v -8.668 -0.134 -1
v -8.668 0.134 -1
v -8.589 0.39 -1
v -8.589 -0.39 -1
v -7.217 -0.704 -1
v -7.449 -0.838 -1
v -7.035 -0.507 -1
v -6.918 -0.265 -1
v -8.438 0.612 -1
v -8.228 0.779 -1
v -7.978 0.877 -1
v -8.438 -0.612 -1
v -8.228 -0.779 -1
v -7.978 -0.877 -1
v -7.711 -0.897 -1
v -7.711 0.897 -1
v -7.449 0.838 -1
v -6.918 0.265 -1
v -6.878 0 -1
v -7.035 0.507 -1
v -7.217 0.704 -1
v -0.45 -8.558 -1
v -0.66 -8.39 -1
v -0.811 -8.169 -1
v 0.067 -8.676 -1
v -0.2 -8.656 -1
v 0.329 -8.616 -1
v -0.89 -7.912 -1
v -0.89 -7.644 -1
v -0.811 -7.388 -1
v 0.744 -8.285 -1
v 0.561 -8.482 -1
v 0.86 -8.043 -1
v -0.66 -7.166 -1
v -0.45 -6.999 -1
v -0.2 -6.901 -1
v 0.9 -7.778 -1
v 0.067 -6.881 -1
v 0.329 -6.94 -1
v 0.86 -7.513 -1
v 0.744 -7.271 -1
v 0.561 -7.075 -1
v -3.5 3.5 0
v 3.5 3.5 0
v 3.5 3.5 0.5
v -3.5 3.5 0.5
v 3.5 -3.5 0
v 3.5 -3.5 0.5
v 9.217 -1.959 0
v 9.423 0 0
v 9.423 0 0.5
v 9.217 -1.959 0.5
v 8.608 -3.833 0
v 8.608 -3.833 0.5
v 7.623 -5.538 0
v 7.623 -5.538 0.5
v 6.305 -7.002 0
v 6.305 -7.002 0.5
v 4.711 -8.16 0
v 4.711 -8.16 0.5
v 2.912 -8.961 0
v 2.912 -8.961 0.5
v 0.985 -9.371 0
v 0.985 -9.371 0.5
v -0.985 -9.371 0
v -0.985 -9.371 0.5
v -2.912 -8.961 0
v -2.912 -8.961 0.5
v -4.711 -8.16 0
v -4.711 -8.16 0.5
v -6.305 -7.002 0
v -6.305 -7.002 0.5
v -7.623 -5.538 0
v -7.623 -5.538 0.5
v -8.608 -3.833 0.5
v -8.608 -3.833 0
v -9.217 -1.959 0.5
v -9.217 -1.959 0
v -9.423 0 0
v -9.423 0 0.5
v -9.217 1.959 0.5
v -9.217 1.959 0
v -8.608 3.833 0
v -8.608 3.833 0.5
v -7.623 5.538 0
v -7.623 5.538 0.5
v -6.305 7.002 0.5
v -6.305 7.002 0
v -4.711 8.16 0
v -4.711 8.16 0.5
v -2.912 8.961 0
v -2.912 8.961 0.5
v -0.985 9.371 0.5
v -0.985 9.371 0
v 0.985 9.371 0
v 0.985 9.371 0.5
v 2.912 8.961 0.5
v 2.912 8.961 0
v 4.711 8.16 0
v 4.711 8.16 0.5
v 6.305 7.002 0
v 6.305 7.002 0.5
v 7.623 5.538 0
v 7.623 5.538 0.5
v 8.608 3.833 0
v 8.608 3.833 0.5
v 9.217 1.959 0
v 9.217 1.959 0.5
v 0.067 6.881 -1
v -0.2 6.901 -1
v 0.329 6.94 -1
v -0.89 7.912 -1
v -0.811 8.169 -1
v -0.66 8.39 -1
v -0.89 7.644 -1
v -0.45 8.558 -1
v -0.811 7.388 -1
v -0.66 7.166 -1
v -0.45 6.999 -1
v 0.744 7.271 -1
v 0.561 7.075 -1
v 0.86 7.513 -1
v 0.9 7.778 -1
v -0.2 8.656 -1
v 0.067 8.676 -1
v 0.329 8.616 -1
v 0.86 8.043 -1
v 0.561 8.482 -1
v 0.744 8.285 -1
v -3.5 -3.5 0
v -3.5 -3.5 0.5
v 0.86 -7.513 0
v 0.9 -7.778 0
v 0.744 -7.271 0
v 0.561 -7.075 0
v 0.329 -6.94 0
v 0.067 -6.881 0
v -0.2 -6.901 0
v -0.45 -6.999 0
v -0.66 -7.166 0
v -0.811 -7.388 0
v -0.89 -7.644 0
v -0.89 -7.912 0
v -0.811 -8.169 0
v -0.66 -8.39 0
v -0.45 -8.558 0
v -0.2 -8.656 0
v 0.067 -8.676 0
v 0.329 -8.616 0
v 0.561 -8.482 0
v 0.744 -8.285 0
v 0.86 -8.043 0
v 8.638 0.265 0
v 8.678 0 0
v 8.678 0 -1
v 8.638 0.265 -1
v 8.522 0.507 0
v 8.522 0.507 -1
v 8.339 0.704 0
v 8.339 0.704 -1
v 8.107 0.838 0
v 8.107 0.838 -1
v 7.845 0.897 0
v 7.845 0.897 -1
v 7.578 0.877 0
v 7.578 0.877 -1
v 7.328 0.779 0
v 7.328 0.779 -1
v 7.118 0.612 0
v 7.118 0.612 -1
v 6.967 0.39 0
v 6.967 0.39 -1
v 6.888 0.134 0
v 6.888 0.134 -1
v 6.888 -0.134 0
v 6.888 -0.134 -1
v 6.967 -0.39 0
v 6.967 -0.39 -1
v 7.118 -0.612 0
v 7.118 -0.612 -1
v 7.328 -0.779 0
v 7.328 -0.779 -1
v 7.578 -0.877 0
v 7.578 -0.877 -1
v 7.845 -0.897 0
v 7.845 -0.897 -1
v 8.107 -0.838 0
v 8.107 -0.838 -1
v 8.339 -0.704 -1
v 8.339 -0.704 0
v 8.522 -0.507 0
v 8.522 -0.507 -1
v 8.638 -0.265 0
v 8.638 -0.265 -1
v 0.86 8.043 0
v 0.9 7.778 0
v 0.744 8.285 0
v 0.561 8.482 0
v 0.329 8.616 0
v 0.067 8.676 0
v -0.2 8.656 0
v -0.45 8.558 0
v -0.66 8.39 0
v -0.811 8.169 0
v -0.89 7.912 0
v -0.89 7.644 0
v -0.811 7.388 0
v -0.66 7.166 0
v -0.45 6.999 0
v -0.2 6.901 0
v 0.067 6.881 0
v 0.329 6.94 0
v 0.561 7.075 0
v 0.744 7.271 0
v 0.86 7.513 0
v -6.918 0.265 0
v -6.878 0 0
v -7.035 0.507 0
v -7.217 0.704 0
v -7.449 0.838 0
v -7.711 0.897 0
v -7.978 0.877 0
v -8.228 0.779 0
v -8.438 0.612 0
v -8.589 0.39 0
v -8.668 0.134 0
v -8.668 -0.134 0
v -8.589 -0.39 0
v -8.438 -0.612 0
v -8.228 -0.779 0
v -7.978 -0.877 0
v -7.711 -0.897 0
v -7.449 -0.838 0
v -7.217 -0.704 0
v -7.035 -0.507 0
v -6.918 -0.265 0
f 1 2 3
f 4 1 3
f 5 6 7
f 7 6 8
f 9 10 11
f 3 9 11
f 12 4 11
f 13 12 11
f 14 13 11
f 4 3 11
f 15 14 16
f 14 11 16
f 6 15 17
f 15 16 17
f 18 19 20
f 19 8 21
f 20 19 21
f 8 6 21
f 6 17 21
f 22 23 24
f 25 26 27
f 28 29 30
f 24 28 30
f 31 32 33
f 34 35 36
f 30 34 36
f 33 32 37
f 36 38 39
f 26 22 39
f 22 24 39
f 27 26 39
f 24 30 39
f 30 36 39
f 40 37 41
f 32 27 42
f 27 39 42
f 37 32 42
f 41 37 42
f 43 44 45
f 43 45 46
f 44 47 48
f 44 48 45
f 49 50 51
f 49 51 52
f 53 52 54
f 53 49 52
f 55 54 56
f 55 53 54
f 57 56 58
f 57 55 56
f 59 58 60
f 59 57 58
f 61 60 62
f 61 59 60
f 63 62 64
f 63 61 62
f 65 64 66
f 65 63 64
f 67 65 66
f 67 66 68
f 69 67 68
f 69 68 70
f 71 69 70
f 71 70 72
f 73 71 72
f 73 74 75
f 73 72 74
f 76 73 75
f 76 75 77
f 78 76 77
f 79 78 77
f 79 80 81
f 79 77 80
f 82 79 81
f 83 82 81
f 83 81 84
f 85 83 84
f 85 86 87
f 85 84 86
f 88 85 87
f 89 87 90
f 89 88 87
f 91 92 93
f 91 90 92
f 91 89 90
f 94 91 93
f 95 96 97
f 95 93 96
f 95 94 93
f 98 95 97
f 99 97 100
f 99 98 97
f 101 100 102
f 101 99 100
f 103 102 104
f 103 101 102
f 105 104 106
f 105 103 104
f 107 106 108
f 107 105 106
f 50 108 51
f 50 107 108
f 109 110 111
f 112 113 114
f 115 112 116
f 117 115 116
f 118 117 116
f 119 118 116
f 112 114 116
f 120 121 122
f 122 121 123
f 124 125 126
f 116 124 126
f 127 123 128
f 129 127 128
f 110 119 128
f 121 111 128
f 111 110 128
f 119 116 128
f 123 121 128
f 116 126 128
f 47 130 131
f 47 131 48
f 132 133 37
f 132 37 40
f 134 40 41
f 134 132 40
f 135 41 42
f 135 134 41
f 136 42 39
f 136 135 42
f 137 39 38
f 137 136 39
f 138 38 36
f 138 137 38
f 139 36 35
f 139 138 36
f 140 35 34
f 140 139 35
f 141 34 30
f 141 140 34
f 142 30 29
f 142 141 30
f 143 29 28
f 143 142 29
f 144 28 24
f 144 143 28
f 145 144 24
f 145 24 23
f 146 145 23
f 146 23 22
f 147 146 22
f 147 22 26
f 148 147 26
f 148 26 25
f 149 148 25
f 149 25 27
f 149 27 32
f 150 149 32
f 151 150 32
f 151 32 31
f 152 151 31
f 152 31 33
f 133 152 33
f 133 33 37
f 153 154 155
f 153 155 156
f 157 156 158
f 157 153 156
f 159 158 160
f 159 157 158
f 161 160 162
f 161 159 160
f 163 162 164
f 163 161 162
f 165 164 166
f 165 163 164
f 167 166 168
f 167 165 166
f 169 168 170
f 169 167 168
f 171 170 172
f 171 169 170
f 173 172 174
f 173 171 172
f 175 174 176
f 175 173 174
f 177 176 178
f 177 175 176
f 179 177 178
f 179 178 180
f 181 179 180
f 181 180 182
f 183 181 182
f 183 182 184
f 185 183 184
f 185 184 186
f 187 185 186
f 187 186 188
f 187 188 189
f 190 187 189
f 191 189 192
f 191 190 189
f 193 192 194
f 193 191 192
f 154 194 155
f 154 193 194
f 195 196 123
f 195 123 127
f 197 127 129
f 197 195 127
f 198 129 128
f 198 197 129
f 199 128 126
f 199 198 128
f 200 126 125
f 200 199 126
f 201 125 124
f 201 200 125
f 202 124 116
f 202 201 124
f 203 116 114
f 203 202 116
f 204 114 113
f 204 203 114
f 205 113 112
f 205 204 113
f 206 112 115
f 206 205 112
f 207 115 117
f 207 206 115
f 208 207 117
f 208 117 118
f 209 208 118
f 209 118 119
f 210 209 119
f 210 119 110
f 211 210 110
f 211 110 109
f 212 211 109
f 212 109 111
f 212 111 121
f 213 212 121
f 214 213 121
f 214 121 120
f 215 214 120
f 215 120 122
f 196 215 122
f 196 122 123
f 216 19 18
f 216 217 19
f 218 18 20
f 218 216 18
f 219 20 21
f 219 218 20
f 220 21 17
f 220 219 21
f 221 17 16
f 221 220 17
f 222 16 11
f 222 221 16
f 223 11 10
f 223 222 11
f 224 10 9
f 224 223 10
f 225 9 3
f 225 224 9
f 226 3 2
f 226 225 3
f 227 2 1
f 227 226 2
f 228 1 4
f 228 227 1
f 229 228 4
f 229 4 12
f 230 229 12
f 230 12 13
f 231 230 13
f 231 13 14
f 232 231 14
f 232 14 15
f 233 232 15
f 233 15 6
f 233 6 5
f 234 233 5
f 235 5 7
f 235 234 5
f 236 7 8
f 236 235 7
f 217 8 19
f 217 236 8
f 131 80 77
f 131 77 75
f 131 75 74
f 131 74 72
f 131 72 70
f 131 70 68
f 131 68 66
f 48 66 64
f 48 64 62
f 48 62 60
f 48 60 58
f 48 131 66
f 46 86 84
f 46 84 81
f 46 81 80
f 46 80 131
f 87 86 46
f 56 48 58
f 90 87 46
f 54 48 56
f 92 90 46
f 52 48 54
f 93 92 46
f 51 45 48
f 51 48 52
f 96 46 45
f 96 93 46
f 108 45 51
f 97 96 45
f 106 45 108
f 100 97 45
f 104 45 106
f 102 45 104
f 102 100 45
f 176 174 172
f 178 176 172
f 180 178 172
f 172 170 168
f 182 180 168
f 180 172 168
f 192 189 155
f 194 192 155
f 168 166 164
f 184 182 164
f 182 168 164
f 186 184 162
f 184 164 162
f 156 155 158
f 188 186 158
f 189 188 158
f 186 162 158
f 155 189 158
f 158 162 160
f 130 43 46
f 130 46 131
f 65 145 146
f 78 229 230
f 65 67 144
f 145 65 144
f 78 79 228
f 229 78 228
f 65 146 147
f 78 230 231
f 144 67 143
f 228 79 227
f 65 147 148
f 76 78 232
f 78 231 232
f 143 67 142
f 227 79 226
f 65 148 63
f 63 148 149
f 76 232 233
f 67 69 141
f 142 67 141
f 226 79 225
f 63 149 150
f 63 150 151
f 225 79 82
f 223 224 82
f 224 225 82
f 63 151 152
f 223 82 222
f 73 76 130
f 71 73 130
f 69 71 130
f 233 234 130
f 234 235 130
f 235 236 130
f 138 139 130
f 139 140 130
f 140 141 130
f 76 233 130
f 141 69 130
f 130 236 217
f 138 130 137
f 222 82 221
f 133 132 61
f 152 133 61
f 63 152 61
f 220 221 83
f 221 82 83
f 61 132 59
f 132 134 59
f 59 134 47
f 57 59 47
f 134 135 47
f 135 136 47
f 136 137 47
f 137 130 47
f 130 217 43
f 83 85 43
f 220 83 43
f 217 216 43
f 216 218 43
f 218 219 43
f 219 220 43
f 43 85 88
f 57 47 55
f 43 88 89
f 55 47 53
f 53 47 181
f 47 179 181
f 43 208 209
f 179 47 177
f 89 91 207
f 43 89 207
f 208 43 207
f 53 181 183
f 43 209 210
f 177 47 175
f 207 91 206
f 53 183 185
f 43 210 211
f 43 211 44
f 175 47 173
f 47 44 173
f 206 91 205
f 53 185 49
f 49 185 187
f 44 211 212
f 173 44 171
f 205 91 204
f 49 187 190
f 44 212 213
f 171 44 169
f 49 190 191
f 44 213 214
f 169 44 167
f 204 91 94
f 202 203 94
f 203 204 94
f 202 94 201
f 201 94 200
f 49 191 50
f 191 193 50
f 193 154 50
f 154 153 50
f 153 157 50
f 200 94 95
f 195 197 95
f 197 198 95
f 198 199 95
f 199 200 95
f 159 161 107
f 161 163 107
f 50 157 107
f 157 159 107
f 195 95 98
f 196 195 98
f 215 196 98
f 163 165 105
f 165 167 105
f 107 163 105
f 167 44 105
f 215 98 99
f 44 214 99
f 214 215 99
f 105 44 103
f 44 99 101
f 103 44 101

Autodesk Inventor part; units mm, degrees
ref_plane "YZ Plane" through (0, 0, 0) normal (1, 0, 0) x (0, 1, 0)
ref_plane "XZ Plane" through (0, 0, 0) normal (0, 1, 0) x (-1, 0, 0)
ref_plane "XY Plane" through (0, 0, 0) normal (0, 0, 1) x (1, 0, 0)
sketch "Sketch1" plane through (0, 0, 0) normal (0, 0, 1) x (1, 0, 0)
  circle A0 centre (-7.7782, 0) radius 1.1 construction
  circle A1 centre (7.7782, 0) radius 1.1 construction
  circle A2 centre (0, -7.7782) radius 1.1 construction
  circle A3 centre (0, 7.7782) radius 1.1 construction
  arc A4 (0, 10) -> (-2.698, 9.6292) centre (0, 0) ccw construction
  arc A5 (-2.698, 9.6292) -> (-5.1958, 8.5442) centre (0, 0) ccw construction
  arc A6 (-5.1958, 8.5442) -> (-7.3084, 6.8255) centre (0, 0) ccw construction
  arc A7 (-7.3084, 6.8255) -> (-8.8789, 4.6007) centre (0, 0) ccw construction
  arc A8 (-8.8789, 4.6007) -> (-9.7908, 2.0346) centre (0, 0) ccw construction
  arc A9 (-9.7908, 2.0346) -> (-9.9767, -0.6824) centre (0, 0) ccw construction
  arc A10 (-9.9767, -0.6824) -> (-9.4226, -3.3488) centre (0, 0) ccw construction
  arc A11 (-9.4226, -3.3488) -> (-8.1697, -5.7668) centre (0, 0) ccw construction
  arc A12 (-8.1697, -5.7668) -> (-6.3109, -7.7571) centre (0, 0) ccw construction
  arc A13 (-6.3109, -7.7571) -> (-3.984, -9.1721) centre (0, 0) ccw construction
  arc A14 (-3.984, -9.1721) -> (-1.3617, -9.9069) centre (0, 0) ccw construction
  arc A15 (-1.3617, -9.9069) -> (1.3617, -9.9069) centre (0, 0) ccw construction
  arc A16 (1.3617, -9.9069) -> (3.984, -9.1721) centre (0, 0) ccw construction
  arc A17 (3.984, -9.1721) -> (6.3109, -7.7571) centre (0, 0) ccw construction
  arc A18 (6.3109, -7.7571) -> (8.1697, -5.7668) centre (0, 0) ccw construction
  arc A19 (8.1697, -5.7668) -> (9.4226, -3.3488) centre (0, 0) ccw construction
  arc A20 (9.4226, -3.3488) -> (9.9767, -0.6824) centre (0, 0) ccw construction
  arc A21 (9.9767, -0.6824) -> (9.7908, 2.0346) centre (0, 0) ccw construction
  arc A22 (9.7908, 2.0346) -> (8.8789, 4.6007) centre (0, 0) ccw construction
  arc A23 (8.8789, 4.6007) -> (7.3084, 6.8255) centre (0, 0) ccw construction
  arc A24 (7.3084, 6.8255) -> (5.1958, 8.5442) centre (0, 0) ccw construction
  arc A25 (5.1958, 8.5442) -> (2.698, 9.6292) centre (0, 0) ccw construction
  arc A26 (2.698, 9.6292) -> (0, 10) centre (0, 0) ccw construction
  circle A27 centre (0, 0) radius 9.4226
  circle A28 centre (7.7782, 0) radius 0.9
  circle A29 centre (0, -7.7782) radius 0.9
  circle A30 centre (-7.7782, 0) radius 0.9
  circle A31 centre (0, 7.7782) radius 0.9
  line L0 (-3.5, -3.5) -> (3.5, -3.5)
  line L1 (3.5, -3.5) -> (3.5, 3.5)
  line L2 (3.5, 3.5) -> (-3.5, 3.5)
  line L3 (-3.5, 3.5) -> (-3.5, -3.5)
  line L4 (-3.5, -3.5) -> (3.5, 3.5) construction
  line L5 (3.5, -3.5) -> (-3.5, 3.5) construction
  line L6 (5.25, 5.25) -> (5.25, -5.25) projected
  line L7 (5.25, -5.25) -> (-5.25, -5.25) projected
  line L8 (-5.25, -5.25) -> (-5.25, 5.25) projected
  line L9 (-5.25, 5.25) -> (5.25, 5.25) projected
  dimension "d0" = 0.2
  dimension "d1" = 0.2
  dimension "d2" = 0.2
  dimension "d3" = 0.2
  dimension "d4" = 7
  dimension "d5" = 7
extrude "Extrusion1" add sketch "Sketch1" along normal blind 0.5 contours A27 | L6 L7 L8 L9
sketch "Sketch2" plane through (0, 0, 0.5) normal (0, 0, 1) x (1, 0, 0)
  line L0 (-3.5, -3.5) -> (-3.5, 3.5) projected
  line L1 (-3.5, 3.5) -> (3.5, 3.5) projected
  line L2 (3.5, 3.5) -> (3.5, -3.5) projected
  line L3 (3.5, -3.5) -> (-3.5, -3.5) projected
  circle A0 centre (0, 7.7782) radius 0.9 projected
  circle A1 centre (-7.7782, 0) radius 0.9 projected
  circle A2 centre (0, -7.7782) radius 0.9 projected
  circle A3 centre (7.7782, 0) radius 0.9 projected
  circle A4 centre (0, 0) radius 9.4226 projected
extrude "Extrusion2" add sketch "Sketch2" against normal blind 1.5 contours A0 | A1 | A2 | A3
properties part number "200_Lambdaplatte_2_conterplate"
